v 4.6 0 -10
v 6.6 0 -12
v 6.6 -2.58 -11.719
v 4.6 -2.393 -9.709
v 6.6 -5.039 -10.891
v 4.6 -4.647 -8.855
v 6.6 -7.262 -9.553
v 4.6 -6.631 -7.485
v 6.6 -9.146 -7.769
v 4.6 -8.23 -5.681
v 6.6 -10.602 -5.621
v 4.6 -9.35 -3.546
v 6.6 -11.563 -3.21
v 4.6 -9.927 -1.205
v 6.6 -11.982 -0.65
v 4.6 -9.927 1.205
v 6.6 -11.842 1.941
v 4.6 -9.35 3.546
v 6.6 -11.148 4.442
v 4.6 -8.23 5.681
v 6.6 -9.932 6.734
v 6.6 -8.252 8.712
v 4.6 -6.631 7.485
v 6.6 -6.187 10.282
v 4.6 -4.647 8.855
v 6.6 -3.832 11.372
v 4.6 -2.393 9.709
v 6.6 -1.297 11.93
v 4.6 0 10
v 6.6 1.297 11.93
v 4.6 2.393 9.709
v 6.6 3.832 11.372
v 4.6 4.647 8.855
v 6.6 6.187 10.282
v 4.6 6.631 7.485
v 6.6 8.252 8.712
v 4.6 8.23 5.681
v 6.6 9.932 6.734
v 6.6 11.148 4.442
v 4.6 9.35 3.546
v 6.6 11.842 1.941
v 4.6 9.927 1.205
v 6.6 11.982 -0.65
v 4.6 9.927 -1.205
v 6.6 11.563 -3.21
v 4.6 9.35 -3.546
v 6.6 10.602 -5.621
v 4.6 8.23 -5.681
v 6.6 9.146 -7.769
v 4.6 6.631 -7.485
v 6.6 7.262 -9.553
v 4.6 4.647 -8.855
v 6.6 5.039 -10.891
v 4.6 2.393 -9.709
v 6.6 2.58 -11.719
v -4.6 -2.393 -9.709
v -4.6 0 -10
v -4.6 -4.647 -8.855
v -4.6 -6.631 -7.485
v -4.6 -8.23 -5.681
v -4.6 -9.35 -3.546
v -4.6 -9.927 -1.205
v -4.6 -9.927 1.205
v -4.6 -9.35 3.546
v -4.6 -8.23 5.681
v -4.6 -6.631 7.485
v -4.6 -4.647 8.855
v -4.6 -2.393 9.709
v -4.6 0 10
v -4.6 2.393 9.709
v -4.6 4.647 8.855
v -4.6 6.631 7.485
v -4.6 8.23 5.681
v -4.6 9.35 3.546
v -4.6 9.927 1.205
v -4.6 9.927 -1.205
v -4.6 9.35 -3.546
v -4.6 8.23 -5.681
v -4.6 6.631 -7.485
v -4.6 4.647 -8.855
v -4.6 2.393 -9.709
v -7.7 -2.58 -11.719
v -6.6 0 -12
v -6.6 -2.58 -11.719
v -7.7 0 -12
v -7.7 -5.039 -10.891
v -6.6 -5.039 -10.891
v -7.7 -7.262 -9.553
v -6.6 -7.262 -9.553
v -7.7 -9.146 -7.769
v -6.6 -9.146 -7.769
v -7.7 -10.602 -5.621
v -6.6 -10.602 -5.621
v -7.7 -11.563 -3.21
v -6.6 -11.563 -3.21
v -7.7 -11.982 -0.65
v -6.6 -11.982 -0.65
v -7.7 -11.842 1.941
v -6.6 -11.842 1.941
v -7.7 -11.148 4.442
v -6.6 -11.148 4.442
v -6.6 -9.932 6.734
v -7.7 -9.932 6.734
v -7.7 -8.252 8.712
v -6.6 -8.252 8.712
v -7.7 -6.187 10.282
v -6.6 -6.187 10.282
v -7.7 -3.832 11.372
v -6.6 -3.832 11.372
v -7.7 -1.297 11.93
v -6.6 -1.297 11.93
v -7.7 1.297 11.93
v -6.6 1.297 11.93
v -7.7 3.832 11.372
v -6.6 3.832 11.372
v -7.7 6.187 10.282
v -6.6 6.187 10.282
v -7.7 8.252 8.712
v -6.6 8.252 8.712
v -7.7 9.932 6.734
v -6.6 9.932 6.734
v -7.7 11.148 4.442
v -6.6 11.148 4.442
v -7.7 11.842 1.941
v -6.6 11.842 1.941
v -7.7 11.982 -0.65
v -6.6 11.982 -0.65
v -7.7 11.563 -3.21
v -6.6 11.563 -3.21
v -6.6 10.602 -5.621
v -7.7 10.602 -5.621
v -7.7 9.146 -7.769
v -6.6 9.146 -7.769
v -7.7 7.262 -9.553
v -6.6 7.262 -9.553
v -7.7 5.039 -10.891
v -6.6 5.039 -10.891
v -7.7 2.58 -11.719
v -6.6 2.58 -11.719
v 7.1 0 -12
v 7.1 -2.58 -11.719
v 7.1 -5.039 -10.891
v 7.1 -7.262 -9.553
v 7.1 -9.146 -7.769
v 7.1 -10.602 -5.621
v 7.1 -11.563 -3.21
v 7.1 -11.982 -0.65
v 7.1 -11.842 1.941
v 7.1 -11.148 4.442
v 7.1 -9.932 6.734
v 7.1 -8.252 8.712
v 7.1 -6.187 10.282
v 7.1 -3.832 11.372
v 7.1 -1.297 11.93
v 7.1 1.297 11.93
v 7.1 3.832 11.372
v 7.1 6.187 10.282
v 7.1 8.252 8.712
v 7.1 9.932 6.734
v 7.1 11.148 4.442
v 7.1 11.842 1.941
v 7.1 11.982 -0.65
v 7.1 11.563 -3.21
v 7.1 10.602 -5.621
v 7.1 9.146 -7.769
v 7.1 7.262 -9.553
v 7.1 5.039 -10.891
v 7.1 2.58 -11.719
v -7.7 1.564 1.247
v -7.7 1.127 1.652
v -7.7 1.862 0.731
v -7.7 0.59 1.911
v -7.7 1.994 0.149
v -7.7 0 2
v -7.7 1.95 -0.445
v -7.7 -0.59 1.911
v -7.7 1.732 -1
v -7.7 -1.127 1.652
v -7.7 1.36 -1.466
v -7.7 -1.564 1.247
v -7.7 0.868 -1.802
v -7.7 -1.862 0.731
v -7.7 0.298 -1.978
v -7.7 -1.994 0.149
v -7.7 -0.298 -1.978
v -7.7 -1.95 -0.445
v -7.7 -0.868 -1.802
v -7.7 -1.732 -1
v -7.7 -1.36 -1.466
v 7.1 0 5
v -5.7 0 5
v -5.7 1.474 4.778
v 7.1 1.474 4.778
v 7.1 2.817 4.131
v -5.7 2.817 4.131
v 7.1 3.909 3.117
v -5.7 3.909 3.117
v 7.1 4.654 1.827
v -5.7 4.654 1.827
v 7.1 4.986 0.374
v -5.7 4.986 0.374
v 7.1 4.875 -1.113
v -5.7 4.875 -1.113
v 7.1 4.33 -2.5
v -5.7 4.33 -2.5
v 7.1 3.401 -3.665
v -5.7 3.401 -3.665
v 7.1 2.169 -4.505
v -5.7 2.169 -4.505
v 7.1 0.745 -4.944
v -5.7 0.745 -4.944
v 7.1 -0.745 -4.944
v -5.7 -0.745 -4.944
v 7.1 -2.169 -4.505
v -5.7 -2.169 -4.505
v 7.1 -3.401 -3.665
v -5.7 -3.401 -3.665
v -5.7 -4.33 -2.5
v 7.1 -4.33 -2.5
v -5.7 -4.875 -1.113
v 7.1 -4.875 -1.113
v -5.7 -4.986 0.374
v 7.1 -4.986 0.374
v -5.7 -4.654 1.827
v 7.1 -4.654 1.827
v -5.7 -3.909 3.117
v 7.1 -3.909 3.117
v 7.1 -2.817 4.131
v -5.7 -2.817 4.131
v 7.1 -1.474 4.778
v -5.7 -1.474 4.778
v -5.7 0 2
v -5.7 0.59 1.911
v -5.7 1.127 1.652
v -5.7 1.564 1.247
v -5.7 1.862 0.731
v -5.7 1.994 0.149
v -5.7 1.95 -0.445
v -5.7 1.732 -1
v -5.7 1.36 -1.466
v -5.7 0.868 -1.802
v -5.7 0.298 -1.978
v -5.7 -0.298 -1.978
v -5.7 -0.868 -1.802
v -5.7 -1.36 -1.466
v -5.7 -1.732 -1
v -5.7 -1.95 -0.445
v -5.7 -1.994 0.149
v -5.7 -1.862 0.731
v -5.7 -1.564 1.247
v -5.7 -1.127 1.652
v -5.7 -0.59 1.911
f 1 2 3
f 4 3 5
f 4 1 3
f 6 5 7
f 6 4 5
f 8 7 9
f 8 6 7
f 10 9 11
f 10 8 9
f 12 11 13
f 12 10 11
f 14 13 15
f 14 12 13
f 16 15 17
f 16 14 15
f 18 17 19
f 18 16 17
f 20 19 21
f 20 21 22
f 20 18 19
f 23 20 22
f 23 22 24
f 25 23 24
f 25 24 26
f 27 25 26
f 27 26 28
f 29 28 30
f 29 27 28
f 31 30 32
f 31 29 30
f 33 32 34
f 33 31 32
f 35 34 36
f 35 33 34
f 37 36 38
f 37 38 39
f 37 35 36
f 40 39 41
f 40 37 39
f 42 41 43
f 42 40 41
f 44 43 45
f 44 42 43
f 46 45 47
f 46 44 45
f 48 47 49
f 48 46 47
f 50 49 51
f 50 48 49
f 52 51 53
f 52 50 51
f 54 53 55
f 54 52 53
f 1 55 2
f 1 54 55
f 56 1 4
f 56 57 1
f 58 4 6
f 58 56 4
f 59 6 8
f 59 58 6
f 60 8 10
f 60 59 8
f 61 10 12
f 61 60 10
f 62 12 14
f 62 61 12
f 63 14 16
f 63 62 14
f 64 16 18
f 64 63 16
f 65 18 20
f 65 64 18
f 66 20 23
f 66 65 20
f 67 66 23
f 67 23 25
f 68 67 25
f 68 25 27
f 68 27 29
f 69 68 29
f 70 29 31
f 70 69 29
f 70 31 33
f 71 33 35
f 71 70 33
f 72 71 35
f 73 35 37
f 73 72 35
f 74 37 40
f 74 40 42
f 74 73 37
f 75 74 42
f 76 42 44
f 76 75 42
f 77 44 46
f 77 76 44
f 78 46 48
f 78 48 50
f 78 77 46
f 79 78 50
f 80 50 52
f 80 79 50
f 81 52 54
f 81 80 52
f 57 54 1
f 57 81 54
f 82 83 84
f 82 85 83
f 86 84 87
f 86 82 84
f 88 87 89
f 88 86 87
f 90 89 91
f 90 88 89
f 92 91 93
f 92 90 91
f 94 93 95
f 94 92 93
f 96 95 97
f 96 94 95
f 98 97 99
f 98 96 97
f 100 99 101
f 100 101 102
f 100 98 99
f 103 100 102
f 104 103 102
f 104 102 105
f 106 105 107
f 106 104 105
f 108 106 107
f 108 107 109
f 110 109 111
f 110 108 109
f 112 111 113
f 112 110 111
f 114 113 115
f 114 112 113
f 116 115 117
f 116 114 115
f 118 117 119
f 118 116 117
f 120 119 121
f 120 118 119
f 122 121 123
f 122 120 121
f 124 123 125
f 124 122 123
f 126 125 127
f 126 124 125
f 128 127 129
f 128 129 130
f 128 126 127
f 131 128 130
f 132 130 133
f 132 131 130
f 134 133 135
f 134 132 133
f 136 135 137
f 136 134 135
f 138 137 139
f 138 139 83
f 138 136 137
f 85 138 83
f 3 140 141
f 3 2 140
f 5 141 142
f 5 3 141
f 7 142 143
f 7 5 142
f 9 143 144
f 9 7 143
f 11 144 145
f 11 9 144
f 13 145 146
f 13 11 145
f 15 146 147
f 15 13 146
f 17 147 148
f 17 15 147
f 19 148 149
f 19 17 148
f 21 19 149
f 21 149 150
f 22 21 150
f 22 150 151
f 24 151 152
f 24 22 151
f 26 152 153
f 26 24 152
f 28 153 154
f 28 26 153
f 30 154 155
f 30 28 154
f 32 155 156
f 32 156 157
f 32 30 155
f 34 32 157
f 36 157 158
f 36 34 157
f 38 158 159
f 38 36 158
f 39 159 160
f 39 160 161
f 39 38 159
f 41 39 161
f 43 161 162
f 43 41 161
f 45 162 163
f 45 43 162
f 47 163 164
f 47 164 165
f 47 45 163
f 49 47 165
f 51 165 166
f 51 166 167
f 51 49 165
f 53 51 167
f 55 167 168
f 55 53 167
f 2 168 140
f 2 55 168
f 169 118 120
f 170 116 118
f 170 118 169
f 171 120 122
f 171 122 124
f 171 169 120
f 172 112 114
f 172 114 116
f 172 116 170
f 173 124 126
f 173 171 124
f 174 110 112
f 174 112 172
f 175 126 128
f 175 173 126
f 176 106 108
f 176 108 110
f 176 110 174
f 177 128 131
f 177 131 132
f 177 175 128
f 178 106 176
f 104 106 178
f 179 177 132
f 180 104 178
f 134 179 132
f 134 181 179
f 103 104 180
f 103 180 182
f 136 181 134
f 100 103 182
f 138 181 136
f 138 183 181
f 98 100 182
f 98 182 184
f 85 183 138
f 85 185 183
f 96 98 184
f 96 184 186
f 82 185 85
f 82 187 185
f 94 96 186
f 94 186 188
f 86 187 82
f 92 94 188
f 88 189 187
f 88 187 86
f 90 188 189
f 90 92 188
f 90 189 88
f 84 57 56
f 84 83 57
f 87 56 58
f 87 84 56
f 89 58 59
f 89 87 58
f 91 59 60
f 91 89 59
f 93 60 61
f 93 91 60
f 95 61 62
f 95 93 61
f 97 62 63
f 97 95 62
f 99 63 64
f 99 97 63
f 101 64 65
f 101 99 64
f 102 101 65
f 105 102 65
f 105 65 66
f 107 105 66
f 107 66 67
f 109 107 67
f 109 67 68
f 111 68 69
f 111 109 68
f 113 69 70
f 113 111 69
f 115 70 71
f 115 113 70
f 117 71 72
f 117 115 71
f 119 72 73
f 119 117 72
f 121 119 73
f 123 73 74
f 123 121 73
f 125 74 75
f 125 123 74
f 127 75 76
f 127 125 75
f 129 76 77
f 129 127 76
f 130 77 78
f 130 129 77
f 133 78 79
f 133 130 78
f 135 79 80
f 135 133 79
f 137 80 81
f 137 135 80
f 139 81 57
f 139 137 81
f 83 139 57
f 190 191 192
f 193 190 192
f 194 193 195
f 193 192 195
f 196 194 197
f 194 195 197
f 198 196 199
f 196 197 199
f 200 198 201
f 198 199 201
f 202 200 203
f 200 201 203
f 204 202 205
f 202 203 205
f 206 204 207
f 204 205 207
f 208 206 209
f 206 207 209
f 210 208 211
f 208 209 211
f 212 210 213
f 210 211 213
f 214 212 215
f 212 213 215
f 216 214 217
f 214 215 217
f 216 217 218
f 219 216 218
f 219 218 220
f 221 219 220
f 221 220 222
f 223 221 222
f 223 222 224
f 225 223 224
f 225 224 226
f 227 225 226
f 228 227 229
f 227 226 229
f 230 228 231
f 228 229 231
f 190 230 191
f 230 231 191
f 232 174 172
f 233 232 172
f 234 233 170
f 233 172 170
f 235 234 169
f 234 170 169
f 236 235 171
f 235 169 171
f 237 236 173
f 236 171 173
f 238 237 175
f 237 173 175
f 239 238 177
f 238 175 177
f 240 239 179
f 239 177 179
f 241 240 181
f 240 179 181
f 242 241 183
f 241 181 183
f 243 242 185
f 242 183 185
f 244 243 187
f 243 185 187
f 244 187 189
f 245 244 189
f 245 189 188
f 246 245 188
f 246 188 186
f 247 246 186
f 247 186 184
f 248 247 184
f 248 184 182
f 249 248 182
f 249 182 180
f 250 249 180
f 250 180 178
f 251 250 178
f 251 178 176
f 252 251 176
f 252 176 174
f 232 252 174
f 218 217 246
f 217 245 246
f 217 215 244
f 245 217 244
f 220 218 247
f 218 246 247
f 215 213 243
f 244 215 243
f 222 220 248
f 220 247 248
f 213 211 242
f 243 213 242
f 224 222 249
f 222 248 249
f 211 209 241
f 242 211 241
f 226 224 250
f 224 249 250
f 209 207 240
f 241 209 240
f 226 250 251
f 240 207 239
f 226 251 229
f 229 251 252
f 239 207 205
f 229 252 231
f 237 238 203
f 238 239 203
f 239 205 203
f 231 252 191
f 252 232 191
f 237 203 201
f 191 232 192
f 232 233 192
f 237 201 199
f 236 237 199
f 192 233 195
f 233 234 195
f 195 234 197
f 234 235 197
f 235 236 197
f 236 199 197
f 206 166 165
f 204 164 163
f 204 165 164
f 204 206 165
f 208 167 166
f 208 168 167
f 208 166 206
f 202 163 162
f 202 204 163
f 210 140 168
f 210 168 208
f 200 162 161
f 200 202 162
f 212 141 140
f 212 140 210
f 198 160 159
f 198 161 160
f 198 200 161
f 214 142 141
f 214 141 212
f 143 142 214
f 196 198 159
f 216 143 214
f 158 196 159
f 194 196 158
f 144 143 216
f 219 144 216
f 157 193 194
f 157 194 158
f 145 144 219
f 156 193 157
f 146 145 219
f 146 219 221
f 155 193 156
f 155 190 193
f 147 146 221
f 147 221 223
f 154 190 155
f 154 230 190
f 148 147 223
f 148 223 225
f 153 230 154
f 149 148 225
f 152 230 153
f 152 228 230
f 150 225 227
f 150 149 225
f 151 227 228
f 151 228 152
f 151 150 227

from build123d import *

# Parameters (mm, degrees)
SKETCH3_R          = 2
CUT_EXTRUDE1_DEPTH = 14.8
CUT_EXTRUDE2_START = -2
SKETCH4_R          = 5
CUT_EXTRUDE2_DEPTH = 12.8


with BuildPart() as part:
    # Sketch2 → Revolve1 (revolve)
    with BuildSketch(Plane(origin=(0, 0, 0), x_dir=(1, 0, 0), z_dir=(0, 1, 0))):
        Polygon((-7.7, 12), (-7.7, 0), (-7.1, 0), (7.1, 0), (7.1, 12), (6.6, 12), (4.6, 10), (-4.6, 10), (-6.6, 12), (-7.1, 12), align=None)
    revolve(axis=Axis((7.1, 0, 0), (-1, 0, 0)))

    # Sketch3 → Cut-Extrude1 (cut)
    with BuildSketch(Plane.ZY.offset(7.7)):
        Circle(SKETCH3_R)
    extrude(amount=-CUT_EXTRUDE1_DEPTH, mode=Mode.SUBTRACT)

    # Sketch4 → Cut-Extrude2 (cut)
    with BuildSketch(Plane.ZY.offset(7.7).offset(CUT_EXTRUDE2_START)):
        Circle(SKETCH4_R)
    extrude(amount=-CUT_EXTRUDE2_DEPTH, mode=Mode.SUBTRACT)


solid = part.part
